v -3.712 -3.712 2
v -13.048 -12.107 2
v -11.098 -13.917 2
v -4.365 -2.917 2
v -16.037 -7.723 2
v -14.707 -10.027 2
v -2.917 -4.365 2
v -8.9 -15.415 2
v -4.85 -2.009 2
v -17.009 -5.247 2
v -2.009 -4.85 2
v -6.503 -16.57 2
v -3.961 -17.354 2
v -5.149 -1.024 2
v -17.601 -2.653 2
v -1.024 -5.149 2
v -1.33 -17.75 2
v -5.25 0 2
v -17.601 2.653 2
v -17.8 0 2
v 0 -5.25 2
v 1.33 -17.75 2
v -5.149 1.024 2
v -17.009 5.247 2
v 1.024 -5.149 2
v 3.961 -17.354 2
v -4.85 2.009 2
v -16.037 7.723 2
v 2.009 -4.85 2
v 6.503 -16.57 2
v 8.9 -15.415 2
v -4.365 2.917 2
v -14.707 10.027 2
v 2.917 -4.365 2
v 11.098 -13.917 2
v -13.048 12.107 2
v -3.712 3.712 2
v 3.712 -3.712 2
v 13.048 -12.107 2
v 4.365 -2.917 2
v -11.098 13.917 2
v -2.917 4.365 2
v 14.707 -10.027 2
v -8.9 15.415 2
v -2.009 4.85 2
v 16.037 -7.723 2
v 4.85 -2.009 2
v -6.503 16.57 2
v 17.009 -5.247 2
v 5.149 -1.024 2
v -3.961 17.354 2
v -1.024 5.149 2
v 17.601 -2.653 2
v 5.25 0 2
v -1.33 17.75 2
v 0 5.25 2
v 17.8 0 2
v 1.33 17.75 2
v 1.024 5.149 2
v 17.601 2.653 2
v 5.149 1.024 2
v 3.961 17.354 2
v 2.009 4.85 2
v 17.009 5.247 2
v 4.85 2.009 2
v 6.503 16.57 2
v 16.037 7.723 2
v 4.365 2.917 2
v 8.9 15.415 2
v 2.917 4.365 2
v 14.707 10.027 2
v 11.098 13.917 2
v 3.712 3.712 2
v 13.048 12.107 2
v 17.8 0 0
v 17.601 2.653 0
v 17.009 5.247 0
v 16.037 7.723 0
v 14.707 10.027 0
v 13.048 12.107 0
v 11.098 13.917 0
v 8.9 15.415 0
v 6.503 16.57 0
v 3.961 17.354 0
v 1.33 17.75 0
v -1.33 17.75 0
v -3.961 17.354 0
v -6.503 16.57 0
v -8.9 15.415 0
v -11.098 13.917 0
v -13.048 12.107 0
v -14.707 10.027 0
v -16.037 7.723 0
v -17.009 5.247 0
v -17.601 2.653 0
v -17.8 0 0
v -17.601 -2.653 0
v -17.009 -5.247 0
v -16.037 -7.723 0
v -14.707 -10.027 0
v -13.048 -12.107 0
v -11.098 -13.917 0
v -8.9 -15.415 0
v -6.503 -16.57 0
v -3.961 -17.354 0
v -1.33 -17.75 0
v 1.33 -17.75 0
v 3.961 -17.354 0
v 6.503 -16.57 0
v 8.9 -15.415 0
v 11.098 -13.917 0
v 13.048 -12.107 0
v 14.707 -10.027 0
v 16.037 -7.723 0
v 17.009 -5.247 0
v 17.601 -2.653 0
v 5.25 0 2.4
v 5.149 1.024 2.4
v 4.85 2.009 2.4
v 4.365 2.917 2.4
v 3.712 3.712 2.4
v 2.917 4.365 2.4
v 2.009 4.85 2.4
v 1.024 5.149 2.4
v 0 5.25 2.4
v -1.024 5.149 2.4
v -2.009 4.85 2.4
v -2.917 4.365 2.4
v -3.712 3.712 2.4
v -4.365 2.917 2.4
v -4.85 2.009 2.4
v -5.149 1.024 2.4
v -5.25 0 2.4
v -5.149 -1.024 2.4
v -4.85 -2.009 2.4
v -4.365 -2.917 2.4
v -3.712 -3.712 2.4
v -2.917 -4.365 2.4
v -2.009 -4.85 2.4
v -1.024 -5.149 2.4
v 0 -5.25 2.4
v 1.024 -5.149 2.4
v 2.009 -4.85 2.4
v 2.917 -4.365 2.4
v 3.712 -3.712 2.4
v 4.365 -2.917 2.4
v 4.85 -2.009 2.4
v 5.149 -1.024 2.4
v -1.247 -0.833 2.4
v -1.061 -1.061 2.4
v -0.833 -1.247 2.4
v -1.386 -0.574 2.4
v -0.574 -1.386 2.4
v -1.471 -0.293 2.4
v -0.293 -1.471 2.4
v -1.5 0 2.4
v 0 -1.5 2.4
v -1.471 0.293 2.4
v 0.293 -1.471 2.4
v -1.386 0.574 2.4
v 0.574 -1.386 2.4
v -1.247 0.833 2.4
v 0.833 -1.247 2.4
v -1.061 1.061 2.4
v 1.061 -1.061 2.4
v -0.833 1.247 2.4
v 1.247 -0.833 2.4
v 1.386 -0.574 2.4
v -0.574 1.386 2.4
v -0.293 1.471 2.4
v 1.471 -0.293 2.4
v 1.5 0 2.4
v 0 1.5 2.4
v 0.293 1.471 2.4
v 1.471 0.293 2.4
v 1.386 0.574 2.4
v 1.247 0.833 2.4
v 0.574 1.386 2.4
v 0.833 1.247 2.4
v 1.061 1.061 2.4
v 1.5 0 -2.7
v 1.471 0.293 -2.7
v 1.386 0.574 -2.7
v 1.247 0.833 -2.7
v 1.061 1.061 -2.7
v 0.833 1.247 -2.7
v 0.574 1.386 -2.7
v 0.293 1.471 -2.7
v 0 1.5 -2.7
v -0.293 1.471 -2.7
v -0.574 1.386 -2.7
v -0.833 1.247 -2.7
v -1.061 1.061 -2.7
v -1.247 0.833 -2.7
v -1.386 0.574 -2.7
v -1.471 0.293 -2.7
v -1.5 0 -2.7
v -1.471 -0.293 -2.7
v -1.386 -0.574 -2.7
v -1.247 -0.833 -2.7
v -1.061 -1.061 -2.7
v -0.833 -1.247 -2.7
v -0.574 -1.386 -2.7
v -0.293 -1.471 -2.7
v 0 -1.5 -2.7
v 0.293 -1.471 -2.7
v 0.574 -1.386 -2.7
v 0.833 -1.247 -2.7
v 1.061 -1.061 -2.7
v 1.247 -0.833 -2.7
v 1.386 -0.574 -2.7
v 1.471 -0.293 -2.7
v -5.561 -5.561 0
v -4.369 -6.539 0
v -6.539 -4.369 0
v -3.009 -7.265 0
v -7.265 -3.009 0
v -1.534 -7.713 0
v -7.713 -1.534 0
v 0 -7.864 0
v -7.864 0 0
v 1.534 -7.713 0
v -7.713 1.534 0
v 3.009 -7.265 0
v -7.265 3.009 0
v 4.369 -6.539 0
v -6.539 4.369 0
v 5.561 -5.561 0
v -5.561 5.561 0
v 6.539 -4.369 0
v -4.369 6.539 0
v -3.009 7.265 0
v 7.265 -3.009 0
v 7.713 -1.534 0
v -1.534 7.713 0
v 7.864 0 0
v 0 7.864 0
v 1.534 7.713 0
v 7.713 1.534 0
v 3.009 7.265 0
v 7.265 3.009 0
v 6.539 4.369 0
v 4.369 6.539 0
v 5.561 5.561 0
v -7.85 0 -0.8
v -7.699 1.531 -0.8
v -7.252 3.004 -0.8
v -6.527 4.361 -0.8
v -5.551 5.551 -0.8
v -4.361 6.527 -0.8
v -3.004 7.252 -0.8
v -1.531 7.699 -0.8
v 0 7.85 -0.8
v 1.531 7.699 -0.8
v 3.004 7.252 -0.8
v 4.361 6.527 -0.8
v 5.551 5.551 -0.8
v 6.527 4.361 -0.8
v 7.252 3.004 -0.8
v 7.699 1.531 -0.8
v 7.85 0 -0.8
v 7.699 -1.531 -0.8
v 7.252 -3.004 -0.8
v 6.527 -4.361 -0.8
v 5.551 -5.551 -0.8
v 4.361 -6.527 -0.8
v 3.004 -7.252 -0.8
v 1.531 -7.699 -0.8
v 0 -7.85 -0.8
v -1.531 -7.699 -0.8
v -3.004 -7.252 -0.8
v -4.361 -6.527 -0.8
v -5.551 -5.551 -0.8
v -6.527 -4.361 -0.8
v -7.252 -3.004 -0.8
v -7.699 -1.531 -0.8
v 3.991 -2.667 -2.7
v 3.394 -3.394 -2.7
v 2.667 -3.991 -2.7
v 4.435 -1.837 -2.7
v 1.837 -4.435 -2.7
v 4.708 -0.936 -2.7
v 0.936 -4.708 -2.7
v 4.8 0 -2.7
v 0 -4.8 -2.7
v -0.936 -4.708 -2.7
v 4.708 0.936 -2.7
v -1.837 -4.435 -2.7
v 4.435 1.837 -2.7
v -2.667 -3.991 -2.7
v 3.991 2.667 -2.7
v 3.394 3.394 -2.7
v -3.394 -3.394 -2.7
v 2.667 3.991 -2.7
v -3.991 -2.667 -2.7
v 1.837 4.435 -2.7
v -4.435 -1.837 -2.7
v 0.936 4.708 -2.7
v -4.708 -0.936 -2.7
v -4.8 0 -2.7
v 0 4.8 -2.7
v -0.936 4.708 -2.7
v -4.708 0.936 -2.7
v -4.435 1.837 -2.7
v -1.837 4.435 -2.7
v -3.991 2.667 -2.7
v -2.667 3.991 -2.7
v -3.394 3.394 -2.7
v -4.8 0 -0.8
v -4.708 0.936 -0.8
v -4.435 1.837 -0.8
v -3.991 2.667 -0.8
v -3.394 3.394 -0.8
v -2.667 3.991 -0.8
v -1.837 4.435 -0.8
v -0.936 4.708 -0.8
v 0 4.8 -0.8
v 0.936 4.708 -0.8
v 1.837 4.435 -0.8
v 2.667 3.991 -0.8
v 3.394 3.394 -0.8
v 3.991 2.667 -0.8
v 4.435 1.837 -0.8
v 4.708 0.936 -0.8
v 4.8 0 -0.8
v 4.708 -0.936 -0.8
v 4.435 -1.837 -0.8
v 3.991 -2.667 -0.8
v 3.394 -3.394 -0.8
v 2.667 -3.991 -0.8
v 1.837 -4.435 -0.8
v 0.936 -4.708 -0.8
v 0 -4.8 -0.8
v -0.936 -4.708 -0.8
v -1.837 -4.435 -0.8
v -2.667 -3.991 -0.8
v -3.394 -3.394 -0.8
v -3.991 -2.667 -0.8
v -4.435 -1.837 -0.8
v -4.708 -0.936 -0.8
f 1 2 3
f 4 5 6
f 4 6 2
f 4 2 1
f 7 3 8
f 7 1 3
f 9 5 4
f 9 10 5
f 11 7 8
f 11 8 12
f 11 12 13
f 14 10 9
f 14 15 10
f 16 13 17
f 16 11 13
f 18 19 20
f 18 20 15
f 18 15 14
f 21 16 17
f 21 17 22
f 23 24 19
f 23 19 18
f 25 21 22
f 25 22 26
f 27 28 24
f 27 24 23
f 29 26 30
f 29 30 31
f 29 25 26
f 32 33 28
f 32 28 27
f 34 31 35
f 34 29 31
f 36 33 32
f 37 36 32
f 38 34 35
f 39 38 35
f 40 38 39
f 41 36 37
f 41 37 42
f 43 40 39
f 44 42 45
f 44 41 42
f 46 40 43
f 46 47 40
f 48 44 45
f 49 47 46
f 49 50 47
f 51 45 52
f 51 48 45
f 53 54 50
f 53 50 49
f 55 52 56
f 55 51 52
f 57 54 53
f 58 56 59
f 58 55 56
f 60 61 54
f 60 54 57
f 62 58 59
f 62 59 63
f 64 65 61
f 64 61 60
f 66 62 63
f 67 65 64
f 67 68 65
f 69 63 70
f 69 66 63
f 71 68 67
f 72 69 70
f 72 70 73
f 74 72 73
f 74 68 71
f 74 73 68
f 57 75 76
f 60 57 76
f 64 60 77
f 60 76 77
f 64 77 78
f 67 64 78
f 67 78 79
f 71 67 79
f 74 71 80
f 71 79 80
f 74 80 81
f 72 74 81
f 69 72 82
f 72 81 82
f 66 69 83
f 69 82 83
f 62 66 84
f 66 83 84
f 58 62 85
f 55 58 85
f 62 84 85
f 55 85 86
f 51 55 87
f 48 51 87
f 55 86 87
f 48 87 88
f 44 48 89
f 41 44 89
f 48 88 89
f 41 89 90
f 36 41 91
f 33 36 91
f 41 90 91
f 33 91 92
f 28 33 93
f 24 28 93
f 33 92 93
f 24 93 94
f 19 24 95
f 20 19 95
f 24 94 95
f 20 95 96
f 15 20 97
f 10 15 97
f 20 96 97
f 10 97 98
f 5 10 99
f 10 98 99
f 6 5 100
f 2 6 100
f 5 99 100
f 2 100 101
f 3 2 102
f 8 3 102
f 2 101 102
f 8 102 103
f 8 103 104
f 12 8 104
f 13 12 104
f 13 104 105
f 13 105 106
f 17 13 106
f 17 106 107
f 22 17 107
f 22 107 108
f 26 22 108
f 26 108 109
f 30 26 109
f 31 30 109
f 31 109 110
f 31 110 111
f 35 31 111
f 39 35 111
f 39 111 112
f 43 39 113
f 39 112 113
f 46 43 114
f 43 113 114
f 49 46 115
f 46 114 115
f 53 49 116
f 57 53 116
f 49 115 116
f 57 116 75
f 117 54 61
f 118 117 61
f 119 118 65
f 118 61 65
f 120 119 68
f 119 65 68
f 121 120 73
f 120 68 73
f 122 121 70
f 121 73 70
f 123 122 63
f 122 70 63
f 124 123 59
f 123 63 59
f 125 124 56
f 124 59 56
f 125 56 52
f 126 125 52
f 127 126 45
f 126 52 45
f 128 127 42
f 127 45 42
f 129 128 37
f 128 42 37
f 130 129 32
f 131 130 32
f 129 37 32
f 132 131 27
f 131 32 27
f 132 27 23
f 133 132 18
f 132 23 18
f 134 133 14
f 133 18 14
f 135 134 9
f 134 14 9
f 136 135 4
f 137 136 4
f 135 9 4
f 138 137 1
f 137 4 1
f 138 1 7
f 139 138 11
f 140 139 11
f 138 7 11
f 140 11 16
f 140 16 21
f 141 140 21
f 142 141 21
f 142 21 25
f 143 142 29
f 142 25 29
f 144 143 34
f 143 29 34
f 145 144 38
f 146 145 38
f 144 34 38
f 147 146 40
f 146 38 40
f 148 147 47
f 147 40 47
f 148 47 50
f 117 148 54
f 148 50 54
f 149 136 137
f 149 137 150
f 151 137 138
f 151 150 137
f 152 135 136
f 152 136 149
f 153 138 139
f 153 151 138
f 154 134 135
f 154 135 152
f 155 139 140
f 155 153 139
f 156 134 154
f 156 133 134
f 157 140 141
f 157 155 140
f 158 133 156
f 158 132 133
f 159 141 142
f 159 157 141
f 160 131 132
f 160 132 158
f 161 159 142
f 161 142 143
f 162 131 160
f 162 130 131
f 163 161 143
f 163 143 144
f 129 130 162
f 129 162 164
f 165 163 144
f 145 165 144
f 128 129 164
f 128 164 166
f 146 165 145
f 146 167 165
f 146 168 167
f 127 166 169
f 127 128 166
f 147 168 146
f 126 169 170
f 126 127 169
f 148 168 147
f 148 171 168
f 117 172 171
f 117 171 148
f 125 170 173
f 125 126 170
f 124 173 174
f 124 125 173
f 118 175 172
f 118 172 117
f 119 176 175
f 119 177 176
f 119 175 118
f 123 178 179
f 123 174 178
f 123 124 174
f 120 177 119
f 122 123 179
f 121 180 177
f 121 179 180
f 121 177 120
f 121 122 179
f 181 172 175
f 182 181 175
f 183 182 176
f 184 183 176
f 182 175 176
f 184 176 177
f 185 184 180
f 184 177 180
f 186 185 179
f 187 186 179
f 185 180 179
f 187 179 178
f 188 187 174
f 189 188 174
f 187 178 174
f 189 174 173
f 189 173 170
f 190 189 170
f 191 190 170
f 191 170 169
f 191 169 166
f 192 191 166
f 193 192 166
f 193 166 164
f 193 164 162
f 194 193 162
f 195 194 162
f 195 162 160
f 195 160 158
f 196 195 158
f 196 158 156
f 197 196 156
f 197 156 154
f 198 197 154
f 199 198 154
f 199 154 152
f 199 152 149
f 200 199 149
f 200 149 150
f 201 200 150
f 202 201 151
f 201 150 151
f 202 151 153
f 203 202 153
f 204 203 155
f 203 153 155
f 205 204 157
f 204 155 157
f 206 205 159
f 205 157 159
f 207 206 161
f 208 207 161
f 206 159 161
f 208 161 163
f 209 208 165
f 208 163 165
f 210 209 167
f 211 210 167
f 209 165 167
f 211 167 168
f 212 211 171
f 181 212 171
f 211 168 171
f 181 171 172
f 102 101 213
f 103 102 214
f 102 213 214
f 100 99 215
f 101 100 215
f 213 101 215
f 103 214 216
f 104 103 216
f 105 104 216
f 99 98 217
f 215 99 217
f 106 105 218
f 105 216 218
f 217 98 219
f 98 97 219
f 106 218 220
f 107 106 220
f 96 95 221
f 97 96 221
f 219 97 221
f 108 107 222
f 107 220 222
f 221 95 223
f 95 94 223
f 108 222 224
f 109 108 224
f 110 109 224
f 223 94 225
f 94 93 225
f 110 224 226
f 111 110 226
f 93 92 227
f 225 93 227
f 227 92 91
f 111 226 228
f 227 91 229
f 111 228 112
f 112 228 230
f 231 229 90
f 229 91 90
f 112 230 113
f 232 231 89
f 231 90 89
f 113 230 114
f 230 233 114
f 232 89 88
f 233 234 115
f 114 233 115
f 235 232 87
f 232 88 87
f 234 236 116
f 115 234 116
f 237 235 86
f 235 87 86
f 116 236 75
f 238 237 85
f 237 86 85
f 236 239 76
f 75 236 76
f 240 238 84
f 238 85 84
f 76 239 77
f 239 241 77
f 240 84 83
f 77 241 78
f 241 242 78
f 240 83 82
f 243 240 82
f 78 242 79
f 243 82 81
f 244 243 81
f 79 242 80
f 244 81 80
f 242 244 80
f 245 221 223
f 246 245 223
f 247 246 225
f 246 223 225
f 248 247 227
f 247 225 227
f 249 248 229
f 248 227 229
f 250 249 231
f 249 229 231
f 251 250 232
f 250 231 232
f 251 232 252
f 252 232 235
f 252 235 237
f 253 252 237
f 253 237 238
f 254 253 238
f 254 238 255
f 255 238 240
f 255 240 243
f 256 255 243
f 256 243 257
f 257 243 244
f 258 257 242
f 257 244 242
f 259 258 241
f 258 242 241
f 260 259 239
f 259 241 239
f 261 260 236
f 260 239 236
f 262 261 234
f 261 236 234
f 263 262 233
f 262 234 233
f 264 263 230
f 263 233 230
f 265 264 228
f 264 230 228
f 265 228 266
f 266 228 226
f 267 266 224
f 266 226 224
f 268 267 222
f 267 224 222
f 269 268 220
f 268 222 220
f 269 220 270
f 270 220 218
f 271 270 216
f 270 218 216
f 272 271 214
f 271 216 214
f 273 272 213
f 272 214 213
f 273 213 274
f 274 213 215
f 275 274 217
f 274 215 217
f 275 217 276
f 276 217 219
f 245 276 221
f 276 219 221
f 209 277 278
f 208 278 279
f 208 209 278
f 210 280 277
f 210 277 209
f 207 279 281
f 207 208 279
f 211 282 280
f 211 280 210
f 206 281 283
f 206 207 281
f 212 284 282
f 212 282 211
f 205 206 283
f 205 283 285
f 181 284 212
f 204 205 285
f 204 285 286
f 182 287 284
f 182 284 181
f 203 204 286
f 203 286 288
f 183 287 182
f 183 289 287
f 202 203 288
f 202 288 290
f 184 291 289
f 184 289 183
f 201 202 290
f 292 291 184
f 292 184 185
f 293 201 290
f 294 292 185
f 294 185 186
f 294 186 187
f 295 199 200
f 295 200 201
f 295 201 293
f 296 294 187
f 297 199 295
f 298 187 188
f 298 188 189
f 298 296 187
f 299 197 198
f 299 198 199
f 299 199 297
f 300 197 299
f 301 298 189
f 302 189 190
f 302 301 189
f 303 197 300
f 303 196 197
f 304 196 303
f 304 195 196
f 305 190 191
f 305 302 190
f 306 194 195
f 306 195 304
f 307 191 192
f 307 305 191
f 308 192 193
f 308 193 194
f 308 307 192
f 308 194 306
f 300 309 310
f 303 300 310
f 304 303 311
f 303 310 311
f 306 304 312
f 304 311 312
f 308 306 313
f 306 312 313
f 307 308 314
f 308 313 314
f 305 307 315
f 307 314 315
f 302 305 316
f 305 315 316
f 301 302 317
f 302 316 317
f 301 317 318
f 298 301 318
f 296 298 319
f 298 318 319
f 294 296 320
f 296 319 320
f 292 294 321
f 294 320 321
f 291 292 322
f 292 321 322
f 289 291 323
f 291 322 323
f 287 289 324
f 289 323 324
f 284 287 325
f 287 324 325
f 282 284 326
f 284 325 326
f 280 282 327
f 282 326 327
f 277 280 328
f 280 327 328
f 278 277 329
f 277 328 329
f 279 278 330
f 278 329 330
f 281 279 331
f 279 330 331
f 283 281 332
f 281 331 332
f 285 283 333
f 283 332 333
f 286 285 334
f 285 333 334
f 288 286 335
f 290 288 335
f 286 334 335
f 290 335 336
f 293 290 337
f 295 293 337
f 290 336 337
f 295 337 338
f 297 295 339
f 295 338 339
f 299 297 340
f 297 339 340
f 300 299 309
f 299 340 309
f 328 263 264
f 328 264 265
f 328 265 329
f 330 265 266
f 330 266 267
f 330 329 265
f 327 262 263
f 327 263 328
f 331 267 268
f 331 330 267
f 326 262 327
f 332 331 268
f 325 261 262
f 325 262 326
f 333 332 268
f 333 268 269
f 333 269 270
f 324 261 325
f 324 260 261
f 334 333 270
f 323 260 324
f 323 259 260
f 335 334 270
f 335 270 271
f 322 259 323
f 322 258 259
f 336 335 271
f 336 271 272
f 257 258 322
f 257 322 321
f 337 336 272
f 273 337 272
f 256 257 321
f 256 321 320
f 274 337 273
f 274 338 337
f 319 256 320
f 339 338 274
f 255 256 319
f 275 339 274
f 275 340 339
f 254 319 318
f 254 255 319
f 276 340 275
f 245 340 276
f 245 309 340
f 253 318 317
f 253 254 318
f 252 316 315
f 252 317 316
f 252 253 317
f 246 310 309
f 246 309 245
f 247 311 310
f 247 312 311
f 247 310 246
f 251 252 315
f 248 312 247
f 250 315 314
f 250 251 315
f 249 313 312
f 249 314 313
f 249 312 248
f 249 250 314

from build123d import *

# Parameters (mm, degrees)
SKETCH_1_R          = 17.8
EXTRUDE_1_DEPTH     = 2
SKETCH_2_R          = 7.85
EXTRUDE_2_DEPTH     = 0.8
DRAFT_1_ANGLE       = 1
SKETCH_38_R         = 4.8
EXTRUDE_3_DEPTH     = 1.9
SKETCH_39_R         = 5.25
EXTRUDE_4_DEPTH     = 0.4
SKETCH_40_R         = 1.5
CUT_EXTRUDE_1_DEPTH = 10.4


with BuildPart() as part:
    # ｽｹｯﾁ1 → ﾎﾞｽ - 押し出し1 (new body)
    with BuildSketch(Plane.XY):
        Circle(SKETCH_1_R)
    extrude(amount=EXTRUDE_1_DEPTH)

    # ｽｹｯﾁ2 → ﾎﾞｽ - 押し出し2 (add)
    with BuildSketch(Plane(origin=(0, 0, 0), x_dir=(-1, 0, 0), z_dir=(0, 0, -1))):
        Circle(SKETCH_2_R)
    extrude(amount=EXTRUDE_2_DEPTH)

    # 抜き勾配1
    draft_1_faces = [part.faces().sort_by_distance(p)[0] for p in [
        (7.85, 0, -0.4),
    ]]
    draft(draft_1_faces, Plane(origin=(0, 0, -0.8), x_dir=(-1, 0, 0), z_dir=(0, 0, -1)), DRAFT_1_ANGLE)

    # ｽｹｯﾁ38 → ﾎﾞｽ - 押し出し3 (add)
    with BuildSketch(Plane(origin=(0, 0, -0.8), x_dir=(-1, 0, 0), z_dir=(0, 0, -1))):
        Circle(SKETCH_38_R)
    extrude(amount=EXTRUDE_3_DEPTH)

    # ｽｹｯﾁ39 → ﾎﾞｽ - 押し出し4 (add)
    with BuildSketch(Plane.XY.offset(2)):
        Circle(SKETCH_39_R)
    extrude(amount=EXTRUDE_4_DEPTH)

    # ｽｹｯﾁ40 → ｶｯﾄ - 押し出し1 (cut)
    with BuildSketch(Plane.XY.offset(2.4)):
        Circle(SKETCH_40_R)
    extrude(amount=-CUT_EXTRUDE_1_DEPTH, mode=Mode.SUBTRACT)


solid = part.part
